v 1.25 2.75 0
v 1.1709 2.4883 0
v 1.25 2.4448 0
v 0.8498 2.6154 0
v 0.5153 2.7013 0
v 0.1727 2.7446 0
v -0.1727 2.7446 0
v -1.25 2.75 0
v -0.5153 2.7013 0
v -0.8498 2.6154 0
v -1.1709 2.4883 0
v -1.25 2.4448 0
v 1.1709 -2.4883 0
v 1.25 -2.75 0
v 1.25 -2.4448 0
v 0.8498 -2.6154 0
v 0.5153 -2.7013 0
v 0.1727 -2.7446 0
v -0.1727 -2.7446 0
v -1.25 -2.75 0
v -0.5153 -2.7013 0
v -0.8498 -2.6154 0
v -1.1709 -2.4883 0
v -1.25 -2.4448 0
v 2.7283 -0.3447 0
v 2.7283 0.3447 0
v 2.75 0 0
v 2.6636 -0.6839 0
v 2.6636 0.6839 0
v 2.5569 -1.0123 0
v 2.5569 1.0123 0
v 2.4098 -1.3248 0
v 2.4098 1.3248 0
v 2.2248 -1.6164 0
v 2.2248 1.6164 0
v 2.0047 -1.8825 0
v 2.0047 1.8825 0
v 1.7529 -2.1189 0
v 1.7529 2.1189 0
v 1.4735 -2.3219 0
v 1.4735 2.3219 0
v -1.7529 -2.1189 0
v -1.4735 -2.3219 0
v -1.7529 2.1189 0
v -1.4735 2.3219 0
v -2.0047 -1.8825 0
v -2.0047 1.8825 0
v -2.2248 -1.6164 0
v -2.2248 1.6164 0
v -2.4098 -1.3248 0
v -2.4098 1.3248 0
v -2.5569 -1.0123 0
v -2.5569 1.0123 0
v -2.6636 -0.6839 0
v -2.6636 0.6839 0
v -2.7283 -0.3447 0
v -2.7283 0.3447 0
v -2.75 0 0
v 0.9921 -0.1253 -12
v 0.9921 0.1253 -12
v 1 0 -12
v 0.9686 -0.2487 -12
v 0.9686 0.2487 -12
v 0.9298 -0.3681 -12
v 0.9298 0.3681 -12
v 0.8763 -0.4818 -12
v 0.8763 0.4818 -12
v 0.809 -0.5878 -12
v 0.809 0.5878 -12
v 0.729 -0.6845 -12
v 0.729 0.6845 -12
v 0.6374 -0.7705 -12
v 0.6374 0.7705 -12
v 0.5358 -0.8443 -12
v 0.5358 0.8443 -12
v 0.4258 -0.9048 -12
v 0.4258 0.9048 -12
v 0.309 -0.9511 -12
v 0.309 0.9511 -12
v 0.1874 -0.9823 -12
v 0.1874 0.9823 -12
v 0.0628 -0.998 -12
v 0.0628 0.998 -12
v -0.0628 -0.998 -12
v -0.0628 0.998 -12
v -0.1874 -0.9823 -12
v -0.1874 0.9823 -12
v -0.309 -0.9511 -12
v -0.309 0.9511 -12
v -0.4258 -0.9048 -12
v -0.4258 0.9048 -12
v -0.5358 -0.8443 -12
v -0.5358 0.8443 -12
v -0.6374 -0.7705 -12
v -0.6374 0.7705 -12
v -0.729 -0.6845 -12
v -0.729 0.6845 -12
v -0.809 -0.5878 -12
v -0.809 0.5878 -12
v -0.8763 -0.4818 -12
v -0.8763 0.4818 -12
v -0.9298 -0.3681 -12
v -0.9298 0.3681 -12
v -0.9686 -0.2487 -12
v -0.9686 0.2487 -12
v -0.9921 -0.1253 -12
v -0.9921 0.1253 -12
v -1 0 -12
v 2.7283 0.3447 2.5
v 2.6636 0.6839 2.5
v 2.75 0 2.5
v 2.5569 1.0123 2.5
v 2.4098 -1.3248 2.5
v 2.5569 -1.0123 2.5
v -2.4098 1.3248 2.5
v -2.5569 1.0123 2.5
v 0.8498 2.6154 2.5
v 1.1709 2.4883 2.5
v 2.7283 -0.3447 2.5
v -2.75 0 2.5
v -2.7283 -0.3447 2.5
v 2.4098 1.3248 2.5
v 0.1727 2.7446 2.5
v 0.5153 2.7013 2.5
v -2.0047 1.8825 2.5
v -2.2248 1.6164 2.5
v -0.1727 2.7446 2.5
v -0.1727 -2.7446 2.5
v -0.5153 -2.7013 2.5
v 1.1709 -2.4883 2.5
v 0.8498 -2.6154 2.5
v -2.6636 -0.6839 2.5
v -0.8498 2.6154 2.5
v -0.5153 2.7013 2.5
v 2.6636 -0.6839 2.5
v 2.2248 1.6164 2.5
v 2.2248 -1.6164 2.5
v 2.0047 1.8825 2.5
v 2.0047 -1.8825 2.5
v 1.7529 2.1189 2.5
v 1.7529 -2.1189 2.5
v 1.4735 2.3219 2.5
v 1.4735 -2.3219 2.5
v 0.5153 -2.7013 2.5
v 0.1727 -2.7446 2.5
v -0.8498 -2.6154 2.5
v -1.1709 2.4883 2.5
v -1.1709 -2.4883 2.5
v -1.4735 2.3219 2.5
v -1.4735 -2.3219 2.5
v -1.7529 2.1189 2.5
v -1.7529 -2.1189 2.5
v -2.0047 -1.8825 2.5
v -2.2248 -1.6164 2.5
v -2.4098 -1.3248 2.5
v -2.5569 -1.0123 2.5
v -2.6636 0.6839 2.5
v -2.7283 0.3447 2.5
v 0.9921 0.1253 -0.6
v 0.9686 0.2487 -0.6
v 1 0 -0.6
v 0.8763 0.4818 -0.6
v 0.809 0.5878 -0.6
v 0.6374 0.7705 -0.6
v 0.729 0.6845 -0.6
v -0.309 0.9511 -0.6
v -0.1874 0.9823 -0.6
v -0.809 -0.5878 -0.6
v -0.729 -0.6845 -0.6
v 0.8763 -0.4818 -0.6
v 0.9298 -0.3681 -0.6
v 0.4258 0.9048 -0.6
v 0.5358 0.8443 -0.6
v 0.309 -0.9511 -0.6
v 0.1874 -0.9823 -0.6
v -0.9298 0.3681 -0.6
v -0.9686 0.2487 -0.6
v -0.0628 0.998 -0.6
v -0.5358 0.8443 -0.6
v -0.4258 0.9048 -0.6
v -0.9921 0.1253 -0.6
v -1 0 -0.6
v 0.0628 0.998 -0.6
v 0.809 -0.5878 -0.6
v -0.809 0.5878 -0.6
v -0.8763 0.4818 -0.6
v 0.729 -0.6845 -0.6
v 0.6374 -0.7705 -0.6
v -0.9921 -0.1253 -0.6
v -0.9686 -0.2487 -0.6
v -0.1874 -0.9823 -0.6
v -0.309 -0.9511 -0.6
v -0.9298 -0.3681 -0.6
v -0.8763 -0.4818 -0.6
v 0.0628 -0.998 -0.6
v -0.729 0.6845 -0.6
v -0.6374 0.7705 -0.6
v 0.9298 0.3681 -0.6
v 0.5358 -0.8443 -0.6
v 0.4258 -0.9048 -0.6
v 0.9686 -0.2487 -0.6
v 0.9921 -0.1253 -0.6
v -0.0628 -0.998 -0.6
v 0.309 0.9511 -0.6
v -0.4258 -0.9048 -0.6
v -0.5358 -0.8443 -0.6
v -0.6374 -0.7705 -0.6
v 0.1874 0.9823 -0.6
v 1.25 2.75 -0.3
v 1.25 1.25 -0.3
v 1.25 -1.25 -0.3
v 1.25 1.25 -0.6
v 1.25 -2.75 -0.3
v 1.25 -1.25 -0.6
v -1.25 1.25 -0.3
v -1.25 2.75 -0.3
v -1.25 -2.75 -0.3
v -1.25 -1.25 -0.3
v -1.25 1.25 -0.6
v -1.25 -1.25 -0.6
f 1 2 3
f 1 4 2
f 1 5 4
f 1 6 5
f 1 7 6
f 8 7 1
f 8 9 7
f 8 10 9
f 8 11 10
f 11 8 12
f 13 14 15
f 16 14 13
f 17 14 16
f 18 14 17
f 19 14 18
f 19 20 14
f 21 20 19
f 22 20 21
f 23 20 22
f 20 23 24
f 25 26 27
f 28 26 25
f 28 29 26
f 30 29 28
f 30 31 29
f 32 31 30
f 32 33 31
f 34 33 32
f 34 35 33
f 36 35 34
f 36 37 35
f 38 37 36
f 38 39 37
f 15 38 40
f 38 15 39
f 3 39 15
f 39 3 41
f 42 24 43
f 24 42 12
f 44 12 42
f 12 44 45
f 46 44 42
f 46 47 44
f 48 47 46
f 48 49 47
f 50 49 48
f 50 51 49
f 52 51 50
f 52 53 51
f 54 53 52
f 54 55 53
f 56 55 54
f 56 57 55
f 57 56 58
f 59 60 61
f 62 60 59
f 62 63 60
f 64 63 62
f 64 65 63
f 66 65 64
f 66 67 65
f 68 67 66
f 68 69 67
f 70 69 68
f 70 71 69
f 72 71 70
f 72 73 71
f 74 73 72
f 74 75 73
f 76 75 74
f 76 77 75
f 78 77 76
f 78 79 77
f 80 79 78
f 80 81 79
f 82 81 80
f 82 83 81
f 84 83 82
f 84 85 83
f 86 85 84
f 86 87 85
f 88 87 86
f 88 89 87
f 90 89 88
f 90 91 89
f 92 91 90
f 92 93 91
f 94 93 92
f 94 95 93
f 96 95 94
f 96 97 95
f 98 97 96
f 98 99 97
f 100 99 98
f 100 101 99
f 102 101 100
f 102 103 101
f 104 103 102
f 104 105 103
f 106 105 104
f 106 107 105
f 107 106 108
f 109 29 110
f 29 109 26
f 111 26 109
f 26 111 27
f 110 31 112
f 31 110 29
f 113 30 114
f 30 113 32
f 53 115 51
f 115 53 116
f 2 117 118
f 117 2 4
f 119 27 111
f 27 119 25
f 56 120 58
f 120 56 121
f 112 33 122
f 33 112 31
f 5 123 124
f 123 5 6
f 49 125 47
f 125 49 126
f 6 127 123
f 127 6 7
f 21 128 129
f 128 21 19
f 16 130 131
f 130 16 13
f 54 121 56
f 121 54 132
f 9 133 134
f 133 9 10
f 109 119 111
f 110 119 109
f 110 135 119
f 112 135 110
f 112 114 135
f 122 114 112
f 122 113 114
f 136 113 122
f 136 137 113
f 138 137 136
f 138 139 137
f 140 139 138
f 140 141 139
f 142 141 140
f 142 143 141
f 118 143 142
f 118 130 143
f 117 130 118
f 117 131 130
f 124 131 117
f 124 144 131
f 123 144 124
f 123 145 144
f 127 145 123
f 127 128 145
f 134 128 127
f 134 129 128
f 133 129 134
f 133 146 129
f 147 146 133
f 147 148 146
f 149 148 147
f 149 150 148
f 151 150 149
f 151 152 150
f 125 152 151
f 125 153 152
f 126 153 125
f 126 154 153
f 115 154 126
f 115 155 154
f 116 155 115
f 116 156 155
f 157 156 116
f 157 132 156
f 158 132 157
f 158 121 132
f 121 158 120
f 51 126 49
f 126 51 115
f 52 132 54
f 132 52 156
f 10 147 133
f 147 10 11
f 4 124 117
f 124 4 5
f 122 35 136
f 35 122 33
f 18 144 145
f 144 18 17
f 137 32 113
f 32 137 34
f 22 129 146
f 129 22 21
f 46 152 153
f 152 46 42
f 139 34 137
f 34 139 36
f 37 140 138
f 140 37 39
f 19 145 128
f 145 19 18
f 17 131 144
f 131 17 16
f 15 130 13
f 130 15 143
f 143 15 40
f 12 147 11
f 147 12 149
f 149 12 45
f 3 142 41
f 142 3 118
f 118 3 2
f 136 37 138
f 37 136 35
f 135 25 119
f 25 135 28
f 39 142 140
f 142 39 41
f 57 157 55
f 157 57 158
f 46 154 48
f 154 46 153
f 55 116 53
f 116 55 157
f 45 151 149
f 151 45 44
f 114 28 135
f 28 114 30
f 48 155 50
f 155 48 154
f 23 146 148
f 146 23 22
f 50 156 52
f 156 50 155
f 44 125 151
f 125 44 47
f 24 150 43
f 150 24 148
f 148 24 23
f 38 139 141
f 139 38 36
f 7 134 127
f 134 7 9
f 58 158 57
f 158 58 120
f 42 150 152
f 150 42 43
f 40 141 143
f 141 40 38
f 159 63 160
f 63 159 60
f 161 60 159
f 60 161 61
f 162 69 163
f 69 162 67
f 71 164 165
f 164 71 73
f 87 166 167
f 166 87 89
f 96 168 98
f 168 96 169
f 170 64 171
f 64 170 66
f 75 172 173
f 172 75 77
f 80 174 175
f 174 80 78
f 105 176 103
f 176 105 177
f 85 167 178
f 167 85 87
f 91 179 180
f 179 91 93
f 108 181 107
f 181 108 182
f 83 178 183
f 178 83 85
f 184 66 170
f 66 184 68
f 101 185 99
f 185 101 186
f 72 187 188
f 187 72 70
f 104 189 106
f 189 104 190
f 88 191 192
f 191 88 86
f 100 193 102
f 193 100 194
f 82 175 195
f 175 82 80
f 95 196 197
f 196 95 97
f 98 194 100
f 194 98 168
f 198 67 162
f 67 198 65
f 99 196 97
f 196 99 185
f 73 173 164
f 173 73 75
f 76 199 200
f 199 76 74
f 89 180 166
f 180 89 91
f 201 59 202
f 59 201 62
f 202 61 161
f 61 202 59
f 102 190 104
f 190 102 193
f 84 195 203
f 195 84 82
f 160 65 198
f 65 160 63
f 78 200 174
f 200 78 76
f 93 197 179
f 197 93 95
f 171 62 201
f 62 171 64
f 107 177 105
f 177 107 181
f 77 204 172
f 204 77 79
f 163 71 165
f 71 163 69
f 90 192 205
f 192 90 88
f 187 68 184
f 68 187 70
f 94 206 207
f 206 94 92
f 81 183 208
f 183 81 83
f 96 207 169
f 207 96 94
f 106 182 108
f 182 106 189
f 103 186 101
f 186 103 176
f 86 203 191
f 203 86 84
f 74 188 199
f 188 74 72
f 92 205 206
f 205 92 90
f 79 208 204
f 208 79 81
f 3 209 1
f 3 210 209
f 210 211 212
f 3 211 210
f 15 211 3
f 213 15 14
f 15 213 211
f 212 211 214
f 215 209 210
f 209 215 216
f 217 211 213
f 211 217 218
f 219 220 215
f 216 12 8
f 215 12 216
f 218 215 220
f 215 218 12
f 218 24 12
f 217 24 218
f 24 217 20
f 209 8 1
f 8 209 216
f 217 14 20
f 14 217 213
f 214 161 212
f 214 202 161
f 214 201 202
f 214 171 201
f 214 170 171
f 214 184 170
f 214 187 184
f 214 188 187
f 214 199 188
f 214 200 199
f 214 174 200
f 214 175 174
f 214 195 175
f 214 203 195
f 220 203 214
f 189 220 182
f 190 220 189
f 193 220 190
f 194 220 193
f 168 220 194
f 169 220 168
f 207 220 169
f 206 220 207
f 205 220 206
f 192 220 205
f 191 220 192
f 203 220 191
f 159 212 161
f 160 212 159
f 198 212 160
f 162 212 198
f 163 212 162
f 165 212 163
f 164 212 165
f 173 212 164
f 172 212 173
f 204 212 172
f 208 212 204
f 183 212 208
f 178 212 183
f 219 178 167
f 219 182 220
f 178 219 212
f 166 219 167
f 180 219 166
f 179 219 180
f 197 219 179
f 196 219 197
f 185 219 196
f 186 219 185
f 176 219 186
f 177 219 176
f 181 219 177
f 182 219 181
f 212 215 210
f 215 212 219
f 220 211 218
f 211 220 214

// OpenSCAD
$fn = 50;


difference() {
	union() {
		translate(v = [0, 0, 0]) {
			rotate(a = [0, 0, 0]) {
				difference() {
					union() {
						translate(v = [0, 0, -12.0000000000]) {
							cylinder(h = 12, r = 0.7500000000);
						}
						cylinder(h = 2.5000000000, r = 2.7500000000);
						translate(v = [0, 0, -12.0000000000]) {
							cylinder(h = 12, r = 1.0000000000);
						}
						translate(v = [-1.2500000000, -2.7500000000, -0.3000000000]) {
							cube(size = [2.5000000000, 5.5000000000, 0.3000000000]);
						}
						translate(v = [-1.2500000000, -1.2500000000, -0.6000000000]) {
							cube(size = [2.5000000000, 2.5000000000, 0.3000000000]);
						}
						translate(v = [0, 0, -12.0000000000]) {
							cylinder(h = 12, r = 0.7500000000);
						}
					}
					union();
				}
			}
		}
	}
	union();
}
